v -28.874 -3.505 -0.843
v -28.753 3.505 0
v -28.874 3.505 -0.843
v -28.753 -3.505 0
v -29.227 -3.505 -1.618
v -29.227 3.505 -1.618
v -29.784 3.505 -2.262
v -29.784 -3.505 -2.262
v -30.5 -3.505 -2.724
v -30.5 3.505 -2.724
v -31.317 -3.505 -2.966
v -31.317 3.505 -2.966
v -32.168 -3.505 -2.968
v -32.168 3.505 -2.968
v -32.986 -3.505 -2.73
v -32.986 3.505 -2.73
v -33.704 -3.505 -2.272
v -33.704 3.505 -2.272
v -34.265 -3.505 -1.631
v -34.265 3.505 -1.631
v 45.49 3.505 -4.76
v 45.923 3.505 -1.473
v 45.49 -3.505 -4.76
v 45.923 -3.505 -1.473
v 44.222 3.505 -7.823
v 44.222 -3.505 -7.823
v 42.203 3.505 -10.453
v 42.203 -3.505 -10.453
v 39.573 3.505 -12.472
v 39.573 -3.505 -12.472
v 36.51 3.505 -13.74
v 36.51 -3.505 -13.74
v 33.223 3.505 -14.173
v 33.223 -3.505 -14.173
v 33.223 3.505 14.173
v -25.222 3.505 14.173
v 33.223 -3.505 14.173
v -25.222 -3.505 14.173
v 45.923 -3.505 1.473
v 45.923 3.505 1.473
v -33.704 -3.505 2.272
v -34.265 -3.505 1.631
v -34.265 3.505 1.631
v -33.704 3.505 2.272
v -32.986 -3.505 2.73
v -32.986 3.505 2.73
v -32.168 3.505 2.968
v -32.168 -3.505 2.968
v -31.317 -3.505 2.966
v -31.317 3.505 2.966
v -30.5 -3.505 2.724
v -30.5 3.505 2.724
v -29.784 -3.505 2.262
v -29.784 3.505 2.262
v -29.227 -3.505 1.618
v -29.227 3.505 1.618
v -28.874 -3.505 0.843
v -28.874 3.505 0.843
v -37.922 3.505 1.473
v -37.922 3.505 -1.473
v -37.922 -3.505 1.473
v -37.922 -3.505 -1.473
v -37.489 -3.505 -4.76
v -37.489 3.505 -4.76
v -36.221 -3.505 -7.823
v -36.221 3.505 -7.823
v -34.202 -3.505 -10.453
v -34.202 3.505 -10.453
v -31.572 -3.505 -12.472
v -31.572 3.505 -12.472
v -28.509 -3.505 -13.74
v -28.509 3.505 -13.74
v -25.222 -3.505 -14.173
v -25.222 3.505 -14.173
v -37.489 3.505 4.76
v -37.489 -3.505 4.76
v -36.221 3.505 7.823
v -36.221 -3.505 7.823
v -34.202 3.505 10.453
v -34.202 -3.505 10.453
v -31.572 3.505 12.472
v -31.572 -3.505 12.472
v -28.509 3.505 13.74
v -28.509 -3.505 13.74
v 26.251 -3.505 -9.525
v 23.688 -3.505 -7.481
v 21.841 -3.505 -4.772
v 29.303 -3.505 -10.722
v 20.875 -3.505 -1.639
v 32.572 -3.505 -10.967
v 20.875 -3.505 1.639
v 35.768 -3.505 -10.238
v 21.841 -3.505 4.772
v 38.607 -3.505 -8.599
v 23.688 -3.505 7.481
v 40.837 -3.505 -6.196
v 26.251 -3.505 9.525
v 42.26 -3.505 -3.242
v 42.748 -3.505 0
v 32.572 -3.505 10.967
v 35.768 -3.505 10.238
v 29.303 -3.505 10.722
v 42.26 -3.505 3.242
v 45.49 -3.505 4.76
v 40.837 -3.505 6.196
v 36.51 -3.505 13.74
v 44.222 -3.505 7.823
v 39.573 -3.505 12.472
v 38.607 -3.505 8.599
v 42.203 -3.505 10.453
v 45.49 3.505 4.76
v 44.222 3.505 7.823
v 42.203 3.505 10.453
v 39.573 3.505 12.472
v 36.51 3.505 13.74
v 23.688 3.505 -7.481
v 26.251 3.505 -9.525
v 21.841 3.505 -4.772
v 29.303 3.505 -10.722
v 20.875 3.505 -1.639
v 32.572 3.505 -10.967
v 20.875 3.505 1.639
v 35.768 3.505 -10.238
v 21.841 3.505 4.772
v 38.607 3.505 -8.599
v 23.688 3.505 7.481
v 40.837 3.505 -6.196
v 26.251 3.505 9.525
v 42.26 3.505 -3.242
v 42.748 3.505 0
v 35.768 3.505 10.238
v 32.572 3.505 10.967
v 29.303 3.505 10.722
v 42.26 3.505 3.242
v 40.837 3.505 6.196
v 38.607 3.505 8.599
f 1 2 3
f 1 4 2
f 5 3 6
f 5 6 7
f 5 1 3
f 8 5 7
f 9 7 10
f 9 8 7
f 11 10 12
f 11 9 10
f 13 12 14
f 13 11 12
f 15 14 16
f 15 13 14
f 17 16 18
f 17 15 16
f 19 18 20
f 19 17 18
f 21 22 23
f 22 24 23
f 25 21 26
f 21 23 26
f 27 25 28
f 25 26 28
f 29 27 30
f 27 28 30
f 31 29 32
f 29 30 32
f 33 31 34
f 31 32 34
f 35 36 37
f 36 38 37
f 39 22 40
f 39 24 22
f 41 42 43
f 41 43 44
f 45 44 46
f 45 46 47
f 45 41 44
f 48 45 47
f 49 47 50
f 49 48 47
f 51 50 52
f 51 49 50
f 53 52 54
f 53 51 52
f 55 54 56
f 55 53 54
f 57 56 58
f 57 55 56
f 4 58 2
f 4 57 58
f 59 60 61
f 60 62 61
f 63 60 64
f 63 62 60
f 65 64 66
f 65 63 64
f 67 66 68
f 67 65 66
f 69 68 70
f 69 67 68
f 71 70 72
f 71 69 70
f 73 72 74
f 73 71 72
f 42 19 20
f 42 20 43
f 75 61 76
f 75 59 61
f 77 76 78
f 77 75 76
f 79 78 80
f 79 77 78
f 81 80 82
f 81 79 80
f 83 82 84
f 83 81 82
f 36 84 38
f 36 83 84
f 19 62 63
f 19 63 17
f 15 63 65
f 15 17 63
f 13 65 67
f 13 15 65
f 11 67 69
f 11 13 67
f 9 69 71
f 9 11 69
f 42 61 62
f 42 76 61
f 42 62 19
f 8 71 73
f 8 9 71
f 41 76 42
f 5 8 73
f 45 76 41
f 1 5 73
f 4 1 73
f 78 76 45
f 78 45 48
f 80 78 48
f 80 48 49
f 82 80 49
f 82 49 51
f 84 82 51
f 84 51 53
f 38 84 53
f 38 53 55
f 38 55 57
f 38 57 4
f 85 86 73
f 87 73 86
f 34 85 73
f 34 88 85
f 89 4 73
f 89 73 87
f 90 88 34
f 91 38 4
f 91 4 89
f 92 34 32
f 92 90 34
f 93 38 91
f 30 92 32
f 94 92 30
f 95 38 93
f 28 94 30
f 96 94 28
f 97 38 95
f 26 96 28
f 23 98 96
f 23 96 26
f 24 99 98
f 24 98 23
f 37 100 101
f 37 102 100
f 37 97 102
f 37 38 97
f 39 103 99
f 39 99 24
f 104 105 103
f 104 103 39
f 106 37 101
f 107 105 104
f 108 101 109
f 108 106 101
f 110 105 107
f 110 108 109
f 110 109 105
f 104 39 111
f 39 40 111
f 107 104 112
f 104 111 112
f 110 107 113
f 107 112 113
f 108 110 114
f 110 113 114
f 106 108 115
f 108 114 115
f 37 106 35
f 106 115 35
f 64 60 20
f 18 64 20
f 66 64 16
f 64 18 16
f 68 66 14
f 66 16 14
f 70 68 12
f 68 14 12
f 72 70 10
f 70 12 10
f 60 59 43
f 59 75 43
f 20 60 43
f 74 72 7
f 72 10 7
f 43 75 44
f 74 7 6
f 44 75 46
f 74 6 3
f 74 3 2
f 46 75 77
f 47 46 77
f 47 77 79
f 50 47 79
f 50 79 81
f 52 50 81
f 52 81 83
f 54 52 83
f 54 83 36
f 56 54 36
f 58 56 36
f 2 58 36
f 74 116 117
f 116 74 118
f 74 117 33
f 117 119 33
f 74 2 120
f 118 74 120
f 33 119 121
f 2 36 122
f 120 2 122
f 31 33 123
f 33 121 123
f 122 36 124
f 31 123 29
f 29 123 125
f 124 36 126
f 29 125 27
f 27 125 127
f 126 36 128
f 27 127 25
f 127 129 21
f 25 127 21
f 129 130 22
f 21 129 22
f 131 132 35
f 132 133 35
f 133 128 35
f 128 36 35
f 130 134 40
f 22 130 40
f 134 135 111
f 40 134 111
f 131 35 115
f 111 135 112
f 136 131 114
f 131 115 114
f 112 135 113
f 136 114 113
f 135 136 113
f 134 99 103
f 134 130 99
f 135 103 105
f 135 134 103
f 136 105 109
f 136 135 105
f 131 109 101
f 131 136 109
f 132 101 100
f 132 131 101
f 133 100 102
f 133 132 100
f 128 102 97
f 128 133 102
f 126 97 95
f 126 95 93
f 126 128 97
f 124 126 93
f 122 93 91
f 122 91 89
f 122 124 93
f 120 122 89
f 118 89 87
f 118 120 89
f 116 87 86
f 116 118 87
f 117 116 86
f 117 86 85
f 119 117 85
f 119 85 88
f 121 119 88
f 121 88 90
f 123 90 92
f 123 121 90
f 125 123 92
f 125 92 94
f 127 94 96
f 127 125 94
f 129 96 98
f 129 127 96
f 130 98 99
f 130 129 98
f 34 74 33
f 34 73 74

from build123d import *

# Parameters (mm, degrees)
F0_W     = 83.8454
F0_H     = 28.3464
F0_R     = 10.9982
F1_DEPTH = 3.5052
F2_R     = 12.7


with BuildPart() as f1:
    # F0 (on Front) → F1 (new body, symmetric)
    with BuildSketch(Plane.XZ):
        with Locations((4.0005, 0)):
            Rectangle(F0_W, F0_H)
        with BuildLine():
            ThreePointArc((-34.2646, 1.630949), (-30.899574, 2.874019), (-28.7528, 0))
            ThreePointArc((-28.7528, 0), (-30.899574, -2.874019), (-34.2646, -1.630949))
            ThreePointArc((-34.2646, -1.630949), (-34.7472, 0), (-34.2646, 1.630949))
        make_face(mode=Mode.SUBTRACT)
        with Locations((31.75, 0)):
            Circle(F0_R, mode=Mode.SUBTRACT)
        with BuildLine():
            Line((-34.2646, -1.630949), (-34.2646, 1.630949))
            ThreePointArc((-34.2646, 1.630949), (-34.7472, 0), (-34.2646, -1.630949))
        make_face()
    extrude(amount=F1_DEPTH, both=True)

    # F2
    f2_edges = [f1.edges().sort_by_distance(p)[0] for p in [
        (-37.9222, 0, 14.1732),
        (-37.9222, 0, -14.1732),
        (45.9232, 0, 14.1732),
        (45.9232, 0, -14.1732),
    ]]
    fillet(f2_edges, radius=F2_R)


solid = f1.part
